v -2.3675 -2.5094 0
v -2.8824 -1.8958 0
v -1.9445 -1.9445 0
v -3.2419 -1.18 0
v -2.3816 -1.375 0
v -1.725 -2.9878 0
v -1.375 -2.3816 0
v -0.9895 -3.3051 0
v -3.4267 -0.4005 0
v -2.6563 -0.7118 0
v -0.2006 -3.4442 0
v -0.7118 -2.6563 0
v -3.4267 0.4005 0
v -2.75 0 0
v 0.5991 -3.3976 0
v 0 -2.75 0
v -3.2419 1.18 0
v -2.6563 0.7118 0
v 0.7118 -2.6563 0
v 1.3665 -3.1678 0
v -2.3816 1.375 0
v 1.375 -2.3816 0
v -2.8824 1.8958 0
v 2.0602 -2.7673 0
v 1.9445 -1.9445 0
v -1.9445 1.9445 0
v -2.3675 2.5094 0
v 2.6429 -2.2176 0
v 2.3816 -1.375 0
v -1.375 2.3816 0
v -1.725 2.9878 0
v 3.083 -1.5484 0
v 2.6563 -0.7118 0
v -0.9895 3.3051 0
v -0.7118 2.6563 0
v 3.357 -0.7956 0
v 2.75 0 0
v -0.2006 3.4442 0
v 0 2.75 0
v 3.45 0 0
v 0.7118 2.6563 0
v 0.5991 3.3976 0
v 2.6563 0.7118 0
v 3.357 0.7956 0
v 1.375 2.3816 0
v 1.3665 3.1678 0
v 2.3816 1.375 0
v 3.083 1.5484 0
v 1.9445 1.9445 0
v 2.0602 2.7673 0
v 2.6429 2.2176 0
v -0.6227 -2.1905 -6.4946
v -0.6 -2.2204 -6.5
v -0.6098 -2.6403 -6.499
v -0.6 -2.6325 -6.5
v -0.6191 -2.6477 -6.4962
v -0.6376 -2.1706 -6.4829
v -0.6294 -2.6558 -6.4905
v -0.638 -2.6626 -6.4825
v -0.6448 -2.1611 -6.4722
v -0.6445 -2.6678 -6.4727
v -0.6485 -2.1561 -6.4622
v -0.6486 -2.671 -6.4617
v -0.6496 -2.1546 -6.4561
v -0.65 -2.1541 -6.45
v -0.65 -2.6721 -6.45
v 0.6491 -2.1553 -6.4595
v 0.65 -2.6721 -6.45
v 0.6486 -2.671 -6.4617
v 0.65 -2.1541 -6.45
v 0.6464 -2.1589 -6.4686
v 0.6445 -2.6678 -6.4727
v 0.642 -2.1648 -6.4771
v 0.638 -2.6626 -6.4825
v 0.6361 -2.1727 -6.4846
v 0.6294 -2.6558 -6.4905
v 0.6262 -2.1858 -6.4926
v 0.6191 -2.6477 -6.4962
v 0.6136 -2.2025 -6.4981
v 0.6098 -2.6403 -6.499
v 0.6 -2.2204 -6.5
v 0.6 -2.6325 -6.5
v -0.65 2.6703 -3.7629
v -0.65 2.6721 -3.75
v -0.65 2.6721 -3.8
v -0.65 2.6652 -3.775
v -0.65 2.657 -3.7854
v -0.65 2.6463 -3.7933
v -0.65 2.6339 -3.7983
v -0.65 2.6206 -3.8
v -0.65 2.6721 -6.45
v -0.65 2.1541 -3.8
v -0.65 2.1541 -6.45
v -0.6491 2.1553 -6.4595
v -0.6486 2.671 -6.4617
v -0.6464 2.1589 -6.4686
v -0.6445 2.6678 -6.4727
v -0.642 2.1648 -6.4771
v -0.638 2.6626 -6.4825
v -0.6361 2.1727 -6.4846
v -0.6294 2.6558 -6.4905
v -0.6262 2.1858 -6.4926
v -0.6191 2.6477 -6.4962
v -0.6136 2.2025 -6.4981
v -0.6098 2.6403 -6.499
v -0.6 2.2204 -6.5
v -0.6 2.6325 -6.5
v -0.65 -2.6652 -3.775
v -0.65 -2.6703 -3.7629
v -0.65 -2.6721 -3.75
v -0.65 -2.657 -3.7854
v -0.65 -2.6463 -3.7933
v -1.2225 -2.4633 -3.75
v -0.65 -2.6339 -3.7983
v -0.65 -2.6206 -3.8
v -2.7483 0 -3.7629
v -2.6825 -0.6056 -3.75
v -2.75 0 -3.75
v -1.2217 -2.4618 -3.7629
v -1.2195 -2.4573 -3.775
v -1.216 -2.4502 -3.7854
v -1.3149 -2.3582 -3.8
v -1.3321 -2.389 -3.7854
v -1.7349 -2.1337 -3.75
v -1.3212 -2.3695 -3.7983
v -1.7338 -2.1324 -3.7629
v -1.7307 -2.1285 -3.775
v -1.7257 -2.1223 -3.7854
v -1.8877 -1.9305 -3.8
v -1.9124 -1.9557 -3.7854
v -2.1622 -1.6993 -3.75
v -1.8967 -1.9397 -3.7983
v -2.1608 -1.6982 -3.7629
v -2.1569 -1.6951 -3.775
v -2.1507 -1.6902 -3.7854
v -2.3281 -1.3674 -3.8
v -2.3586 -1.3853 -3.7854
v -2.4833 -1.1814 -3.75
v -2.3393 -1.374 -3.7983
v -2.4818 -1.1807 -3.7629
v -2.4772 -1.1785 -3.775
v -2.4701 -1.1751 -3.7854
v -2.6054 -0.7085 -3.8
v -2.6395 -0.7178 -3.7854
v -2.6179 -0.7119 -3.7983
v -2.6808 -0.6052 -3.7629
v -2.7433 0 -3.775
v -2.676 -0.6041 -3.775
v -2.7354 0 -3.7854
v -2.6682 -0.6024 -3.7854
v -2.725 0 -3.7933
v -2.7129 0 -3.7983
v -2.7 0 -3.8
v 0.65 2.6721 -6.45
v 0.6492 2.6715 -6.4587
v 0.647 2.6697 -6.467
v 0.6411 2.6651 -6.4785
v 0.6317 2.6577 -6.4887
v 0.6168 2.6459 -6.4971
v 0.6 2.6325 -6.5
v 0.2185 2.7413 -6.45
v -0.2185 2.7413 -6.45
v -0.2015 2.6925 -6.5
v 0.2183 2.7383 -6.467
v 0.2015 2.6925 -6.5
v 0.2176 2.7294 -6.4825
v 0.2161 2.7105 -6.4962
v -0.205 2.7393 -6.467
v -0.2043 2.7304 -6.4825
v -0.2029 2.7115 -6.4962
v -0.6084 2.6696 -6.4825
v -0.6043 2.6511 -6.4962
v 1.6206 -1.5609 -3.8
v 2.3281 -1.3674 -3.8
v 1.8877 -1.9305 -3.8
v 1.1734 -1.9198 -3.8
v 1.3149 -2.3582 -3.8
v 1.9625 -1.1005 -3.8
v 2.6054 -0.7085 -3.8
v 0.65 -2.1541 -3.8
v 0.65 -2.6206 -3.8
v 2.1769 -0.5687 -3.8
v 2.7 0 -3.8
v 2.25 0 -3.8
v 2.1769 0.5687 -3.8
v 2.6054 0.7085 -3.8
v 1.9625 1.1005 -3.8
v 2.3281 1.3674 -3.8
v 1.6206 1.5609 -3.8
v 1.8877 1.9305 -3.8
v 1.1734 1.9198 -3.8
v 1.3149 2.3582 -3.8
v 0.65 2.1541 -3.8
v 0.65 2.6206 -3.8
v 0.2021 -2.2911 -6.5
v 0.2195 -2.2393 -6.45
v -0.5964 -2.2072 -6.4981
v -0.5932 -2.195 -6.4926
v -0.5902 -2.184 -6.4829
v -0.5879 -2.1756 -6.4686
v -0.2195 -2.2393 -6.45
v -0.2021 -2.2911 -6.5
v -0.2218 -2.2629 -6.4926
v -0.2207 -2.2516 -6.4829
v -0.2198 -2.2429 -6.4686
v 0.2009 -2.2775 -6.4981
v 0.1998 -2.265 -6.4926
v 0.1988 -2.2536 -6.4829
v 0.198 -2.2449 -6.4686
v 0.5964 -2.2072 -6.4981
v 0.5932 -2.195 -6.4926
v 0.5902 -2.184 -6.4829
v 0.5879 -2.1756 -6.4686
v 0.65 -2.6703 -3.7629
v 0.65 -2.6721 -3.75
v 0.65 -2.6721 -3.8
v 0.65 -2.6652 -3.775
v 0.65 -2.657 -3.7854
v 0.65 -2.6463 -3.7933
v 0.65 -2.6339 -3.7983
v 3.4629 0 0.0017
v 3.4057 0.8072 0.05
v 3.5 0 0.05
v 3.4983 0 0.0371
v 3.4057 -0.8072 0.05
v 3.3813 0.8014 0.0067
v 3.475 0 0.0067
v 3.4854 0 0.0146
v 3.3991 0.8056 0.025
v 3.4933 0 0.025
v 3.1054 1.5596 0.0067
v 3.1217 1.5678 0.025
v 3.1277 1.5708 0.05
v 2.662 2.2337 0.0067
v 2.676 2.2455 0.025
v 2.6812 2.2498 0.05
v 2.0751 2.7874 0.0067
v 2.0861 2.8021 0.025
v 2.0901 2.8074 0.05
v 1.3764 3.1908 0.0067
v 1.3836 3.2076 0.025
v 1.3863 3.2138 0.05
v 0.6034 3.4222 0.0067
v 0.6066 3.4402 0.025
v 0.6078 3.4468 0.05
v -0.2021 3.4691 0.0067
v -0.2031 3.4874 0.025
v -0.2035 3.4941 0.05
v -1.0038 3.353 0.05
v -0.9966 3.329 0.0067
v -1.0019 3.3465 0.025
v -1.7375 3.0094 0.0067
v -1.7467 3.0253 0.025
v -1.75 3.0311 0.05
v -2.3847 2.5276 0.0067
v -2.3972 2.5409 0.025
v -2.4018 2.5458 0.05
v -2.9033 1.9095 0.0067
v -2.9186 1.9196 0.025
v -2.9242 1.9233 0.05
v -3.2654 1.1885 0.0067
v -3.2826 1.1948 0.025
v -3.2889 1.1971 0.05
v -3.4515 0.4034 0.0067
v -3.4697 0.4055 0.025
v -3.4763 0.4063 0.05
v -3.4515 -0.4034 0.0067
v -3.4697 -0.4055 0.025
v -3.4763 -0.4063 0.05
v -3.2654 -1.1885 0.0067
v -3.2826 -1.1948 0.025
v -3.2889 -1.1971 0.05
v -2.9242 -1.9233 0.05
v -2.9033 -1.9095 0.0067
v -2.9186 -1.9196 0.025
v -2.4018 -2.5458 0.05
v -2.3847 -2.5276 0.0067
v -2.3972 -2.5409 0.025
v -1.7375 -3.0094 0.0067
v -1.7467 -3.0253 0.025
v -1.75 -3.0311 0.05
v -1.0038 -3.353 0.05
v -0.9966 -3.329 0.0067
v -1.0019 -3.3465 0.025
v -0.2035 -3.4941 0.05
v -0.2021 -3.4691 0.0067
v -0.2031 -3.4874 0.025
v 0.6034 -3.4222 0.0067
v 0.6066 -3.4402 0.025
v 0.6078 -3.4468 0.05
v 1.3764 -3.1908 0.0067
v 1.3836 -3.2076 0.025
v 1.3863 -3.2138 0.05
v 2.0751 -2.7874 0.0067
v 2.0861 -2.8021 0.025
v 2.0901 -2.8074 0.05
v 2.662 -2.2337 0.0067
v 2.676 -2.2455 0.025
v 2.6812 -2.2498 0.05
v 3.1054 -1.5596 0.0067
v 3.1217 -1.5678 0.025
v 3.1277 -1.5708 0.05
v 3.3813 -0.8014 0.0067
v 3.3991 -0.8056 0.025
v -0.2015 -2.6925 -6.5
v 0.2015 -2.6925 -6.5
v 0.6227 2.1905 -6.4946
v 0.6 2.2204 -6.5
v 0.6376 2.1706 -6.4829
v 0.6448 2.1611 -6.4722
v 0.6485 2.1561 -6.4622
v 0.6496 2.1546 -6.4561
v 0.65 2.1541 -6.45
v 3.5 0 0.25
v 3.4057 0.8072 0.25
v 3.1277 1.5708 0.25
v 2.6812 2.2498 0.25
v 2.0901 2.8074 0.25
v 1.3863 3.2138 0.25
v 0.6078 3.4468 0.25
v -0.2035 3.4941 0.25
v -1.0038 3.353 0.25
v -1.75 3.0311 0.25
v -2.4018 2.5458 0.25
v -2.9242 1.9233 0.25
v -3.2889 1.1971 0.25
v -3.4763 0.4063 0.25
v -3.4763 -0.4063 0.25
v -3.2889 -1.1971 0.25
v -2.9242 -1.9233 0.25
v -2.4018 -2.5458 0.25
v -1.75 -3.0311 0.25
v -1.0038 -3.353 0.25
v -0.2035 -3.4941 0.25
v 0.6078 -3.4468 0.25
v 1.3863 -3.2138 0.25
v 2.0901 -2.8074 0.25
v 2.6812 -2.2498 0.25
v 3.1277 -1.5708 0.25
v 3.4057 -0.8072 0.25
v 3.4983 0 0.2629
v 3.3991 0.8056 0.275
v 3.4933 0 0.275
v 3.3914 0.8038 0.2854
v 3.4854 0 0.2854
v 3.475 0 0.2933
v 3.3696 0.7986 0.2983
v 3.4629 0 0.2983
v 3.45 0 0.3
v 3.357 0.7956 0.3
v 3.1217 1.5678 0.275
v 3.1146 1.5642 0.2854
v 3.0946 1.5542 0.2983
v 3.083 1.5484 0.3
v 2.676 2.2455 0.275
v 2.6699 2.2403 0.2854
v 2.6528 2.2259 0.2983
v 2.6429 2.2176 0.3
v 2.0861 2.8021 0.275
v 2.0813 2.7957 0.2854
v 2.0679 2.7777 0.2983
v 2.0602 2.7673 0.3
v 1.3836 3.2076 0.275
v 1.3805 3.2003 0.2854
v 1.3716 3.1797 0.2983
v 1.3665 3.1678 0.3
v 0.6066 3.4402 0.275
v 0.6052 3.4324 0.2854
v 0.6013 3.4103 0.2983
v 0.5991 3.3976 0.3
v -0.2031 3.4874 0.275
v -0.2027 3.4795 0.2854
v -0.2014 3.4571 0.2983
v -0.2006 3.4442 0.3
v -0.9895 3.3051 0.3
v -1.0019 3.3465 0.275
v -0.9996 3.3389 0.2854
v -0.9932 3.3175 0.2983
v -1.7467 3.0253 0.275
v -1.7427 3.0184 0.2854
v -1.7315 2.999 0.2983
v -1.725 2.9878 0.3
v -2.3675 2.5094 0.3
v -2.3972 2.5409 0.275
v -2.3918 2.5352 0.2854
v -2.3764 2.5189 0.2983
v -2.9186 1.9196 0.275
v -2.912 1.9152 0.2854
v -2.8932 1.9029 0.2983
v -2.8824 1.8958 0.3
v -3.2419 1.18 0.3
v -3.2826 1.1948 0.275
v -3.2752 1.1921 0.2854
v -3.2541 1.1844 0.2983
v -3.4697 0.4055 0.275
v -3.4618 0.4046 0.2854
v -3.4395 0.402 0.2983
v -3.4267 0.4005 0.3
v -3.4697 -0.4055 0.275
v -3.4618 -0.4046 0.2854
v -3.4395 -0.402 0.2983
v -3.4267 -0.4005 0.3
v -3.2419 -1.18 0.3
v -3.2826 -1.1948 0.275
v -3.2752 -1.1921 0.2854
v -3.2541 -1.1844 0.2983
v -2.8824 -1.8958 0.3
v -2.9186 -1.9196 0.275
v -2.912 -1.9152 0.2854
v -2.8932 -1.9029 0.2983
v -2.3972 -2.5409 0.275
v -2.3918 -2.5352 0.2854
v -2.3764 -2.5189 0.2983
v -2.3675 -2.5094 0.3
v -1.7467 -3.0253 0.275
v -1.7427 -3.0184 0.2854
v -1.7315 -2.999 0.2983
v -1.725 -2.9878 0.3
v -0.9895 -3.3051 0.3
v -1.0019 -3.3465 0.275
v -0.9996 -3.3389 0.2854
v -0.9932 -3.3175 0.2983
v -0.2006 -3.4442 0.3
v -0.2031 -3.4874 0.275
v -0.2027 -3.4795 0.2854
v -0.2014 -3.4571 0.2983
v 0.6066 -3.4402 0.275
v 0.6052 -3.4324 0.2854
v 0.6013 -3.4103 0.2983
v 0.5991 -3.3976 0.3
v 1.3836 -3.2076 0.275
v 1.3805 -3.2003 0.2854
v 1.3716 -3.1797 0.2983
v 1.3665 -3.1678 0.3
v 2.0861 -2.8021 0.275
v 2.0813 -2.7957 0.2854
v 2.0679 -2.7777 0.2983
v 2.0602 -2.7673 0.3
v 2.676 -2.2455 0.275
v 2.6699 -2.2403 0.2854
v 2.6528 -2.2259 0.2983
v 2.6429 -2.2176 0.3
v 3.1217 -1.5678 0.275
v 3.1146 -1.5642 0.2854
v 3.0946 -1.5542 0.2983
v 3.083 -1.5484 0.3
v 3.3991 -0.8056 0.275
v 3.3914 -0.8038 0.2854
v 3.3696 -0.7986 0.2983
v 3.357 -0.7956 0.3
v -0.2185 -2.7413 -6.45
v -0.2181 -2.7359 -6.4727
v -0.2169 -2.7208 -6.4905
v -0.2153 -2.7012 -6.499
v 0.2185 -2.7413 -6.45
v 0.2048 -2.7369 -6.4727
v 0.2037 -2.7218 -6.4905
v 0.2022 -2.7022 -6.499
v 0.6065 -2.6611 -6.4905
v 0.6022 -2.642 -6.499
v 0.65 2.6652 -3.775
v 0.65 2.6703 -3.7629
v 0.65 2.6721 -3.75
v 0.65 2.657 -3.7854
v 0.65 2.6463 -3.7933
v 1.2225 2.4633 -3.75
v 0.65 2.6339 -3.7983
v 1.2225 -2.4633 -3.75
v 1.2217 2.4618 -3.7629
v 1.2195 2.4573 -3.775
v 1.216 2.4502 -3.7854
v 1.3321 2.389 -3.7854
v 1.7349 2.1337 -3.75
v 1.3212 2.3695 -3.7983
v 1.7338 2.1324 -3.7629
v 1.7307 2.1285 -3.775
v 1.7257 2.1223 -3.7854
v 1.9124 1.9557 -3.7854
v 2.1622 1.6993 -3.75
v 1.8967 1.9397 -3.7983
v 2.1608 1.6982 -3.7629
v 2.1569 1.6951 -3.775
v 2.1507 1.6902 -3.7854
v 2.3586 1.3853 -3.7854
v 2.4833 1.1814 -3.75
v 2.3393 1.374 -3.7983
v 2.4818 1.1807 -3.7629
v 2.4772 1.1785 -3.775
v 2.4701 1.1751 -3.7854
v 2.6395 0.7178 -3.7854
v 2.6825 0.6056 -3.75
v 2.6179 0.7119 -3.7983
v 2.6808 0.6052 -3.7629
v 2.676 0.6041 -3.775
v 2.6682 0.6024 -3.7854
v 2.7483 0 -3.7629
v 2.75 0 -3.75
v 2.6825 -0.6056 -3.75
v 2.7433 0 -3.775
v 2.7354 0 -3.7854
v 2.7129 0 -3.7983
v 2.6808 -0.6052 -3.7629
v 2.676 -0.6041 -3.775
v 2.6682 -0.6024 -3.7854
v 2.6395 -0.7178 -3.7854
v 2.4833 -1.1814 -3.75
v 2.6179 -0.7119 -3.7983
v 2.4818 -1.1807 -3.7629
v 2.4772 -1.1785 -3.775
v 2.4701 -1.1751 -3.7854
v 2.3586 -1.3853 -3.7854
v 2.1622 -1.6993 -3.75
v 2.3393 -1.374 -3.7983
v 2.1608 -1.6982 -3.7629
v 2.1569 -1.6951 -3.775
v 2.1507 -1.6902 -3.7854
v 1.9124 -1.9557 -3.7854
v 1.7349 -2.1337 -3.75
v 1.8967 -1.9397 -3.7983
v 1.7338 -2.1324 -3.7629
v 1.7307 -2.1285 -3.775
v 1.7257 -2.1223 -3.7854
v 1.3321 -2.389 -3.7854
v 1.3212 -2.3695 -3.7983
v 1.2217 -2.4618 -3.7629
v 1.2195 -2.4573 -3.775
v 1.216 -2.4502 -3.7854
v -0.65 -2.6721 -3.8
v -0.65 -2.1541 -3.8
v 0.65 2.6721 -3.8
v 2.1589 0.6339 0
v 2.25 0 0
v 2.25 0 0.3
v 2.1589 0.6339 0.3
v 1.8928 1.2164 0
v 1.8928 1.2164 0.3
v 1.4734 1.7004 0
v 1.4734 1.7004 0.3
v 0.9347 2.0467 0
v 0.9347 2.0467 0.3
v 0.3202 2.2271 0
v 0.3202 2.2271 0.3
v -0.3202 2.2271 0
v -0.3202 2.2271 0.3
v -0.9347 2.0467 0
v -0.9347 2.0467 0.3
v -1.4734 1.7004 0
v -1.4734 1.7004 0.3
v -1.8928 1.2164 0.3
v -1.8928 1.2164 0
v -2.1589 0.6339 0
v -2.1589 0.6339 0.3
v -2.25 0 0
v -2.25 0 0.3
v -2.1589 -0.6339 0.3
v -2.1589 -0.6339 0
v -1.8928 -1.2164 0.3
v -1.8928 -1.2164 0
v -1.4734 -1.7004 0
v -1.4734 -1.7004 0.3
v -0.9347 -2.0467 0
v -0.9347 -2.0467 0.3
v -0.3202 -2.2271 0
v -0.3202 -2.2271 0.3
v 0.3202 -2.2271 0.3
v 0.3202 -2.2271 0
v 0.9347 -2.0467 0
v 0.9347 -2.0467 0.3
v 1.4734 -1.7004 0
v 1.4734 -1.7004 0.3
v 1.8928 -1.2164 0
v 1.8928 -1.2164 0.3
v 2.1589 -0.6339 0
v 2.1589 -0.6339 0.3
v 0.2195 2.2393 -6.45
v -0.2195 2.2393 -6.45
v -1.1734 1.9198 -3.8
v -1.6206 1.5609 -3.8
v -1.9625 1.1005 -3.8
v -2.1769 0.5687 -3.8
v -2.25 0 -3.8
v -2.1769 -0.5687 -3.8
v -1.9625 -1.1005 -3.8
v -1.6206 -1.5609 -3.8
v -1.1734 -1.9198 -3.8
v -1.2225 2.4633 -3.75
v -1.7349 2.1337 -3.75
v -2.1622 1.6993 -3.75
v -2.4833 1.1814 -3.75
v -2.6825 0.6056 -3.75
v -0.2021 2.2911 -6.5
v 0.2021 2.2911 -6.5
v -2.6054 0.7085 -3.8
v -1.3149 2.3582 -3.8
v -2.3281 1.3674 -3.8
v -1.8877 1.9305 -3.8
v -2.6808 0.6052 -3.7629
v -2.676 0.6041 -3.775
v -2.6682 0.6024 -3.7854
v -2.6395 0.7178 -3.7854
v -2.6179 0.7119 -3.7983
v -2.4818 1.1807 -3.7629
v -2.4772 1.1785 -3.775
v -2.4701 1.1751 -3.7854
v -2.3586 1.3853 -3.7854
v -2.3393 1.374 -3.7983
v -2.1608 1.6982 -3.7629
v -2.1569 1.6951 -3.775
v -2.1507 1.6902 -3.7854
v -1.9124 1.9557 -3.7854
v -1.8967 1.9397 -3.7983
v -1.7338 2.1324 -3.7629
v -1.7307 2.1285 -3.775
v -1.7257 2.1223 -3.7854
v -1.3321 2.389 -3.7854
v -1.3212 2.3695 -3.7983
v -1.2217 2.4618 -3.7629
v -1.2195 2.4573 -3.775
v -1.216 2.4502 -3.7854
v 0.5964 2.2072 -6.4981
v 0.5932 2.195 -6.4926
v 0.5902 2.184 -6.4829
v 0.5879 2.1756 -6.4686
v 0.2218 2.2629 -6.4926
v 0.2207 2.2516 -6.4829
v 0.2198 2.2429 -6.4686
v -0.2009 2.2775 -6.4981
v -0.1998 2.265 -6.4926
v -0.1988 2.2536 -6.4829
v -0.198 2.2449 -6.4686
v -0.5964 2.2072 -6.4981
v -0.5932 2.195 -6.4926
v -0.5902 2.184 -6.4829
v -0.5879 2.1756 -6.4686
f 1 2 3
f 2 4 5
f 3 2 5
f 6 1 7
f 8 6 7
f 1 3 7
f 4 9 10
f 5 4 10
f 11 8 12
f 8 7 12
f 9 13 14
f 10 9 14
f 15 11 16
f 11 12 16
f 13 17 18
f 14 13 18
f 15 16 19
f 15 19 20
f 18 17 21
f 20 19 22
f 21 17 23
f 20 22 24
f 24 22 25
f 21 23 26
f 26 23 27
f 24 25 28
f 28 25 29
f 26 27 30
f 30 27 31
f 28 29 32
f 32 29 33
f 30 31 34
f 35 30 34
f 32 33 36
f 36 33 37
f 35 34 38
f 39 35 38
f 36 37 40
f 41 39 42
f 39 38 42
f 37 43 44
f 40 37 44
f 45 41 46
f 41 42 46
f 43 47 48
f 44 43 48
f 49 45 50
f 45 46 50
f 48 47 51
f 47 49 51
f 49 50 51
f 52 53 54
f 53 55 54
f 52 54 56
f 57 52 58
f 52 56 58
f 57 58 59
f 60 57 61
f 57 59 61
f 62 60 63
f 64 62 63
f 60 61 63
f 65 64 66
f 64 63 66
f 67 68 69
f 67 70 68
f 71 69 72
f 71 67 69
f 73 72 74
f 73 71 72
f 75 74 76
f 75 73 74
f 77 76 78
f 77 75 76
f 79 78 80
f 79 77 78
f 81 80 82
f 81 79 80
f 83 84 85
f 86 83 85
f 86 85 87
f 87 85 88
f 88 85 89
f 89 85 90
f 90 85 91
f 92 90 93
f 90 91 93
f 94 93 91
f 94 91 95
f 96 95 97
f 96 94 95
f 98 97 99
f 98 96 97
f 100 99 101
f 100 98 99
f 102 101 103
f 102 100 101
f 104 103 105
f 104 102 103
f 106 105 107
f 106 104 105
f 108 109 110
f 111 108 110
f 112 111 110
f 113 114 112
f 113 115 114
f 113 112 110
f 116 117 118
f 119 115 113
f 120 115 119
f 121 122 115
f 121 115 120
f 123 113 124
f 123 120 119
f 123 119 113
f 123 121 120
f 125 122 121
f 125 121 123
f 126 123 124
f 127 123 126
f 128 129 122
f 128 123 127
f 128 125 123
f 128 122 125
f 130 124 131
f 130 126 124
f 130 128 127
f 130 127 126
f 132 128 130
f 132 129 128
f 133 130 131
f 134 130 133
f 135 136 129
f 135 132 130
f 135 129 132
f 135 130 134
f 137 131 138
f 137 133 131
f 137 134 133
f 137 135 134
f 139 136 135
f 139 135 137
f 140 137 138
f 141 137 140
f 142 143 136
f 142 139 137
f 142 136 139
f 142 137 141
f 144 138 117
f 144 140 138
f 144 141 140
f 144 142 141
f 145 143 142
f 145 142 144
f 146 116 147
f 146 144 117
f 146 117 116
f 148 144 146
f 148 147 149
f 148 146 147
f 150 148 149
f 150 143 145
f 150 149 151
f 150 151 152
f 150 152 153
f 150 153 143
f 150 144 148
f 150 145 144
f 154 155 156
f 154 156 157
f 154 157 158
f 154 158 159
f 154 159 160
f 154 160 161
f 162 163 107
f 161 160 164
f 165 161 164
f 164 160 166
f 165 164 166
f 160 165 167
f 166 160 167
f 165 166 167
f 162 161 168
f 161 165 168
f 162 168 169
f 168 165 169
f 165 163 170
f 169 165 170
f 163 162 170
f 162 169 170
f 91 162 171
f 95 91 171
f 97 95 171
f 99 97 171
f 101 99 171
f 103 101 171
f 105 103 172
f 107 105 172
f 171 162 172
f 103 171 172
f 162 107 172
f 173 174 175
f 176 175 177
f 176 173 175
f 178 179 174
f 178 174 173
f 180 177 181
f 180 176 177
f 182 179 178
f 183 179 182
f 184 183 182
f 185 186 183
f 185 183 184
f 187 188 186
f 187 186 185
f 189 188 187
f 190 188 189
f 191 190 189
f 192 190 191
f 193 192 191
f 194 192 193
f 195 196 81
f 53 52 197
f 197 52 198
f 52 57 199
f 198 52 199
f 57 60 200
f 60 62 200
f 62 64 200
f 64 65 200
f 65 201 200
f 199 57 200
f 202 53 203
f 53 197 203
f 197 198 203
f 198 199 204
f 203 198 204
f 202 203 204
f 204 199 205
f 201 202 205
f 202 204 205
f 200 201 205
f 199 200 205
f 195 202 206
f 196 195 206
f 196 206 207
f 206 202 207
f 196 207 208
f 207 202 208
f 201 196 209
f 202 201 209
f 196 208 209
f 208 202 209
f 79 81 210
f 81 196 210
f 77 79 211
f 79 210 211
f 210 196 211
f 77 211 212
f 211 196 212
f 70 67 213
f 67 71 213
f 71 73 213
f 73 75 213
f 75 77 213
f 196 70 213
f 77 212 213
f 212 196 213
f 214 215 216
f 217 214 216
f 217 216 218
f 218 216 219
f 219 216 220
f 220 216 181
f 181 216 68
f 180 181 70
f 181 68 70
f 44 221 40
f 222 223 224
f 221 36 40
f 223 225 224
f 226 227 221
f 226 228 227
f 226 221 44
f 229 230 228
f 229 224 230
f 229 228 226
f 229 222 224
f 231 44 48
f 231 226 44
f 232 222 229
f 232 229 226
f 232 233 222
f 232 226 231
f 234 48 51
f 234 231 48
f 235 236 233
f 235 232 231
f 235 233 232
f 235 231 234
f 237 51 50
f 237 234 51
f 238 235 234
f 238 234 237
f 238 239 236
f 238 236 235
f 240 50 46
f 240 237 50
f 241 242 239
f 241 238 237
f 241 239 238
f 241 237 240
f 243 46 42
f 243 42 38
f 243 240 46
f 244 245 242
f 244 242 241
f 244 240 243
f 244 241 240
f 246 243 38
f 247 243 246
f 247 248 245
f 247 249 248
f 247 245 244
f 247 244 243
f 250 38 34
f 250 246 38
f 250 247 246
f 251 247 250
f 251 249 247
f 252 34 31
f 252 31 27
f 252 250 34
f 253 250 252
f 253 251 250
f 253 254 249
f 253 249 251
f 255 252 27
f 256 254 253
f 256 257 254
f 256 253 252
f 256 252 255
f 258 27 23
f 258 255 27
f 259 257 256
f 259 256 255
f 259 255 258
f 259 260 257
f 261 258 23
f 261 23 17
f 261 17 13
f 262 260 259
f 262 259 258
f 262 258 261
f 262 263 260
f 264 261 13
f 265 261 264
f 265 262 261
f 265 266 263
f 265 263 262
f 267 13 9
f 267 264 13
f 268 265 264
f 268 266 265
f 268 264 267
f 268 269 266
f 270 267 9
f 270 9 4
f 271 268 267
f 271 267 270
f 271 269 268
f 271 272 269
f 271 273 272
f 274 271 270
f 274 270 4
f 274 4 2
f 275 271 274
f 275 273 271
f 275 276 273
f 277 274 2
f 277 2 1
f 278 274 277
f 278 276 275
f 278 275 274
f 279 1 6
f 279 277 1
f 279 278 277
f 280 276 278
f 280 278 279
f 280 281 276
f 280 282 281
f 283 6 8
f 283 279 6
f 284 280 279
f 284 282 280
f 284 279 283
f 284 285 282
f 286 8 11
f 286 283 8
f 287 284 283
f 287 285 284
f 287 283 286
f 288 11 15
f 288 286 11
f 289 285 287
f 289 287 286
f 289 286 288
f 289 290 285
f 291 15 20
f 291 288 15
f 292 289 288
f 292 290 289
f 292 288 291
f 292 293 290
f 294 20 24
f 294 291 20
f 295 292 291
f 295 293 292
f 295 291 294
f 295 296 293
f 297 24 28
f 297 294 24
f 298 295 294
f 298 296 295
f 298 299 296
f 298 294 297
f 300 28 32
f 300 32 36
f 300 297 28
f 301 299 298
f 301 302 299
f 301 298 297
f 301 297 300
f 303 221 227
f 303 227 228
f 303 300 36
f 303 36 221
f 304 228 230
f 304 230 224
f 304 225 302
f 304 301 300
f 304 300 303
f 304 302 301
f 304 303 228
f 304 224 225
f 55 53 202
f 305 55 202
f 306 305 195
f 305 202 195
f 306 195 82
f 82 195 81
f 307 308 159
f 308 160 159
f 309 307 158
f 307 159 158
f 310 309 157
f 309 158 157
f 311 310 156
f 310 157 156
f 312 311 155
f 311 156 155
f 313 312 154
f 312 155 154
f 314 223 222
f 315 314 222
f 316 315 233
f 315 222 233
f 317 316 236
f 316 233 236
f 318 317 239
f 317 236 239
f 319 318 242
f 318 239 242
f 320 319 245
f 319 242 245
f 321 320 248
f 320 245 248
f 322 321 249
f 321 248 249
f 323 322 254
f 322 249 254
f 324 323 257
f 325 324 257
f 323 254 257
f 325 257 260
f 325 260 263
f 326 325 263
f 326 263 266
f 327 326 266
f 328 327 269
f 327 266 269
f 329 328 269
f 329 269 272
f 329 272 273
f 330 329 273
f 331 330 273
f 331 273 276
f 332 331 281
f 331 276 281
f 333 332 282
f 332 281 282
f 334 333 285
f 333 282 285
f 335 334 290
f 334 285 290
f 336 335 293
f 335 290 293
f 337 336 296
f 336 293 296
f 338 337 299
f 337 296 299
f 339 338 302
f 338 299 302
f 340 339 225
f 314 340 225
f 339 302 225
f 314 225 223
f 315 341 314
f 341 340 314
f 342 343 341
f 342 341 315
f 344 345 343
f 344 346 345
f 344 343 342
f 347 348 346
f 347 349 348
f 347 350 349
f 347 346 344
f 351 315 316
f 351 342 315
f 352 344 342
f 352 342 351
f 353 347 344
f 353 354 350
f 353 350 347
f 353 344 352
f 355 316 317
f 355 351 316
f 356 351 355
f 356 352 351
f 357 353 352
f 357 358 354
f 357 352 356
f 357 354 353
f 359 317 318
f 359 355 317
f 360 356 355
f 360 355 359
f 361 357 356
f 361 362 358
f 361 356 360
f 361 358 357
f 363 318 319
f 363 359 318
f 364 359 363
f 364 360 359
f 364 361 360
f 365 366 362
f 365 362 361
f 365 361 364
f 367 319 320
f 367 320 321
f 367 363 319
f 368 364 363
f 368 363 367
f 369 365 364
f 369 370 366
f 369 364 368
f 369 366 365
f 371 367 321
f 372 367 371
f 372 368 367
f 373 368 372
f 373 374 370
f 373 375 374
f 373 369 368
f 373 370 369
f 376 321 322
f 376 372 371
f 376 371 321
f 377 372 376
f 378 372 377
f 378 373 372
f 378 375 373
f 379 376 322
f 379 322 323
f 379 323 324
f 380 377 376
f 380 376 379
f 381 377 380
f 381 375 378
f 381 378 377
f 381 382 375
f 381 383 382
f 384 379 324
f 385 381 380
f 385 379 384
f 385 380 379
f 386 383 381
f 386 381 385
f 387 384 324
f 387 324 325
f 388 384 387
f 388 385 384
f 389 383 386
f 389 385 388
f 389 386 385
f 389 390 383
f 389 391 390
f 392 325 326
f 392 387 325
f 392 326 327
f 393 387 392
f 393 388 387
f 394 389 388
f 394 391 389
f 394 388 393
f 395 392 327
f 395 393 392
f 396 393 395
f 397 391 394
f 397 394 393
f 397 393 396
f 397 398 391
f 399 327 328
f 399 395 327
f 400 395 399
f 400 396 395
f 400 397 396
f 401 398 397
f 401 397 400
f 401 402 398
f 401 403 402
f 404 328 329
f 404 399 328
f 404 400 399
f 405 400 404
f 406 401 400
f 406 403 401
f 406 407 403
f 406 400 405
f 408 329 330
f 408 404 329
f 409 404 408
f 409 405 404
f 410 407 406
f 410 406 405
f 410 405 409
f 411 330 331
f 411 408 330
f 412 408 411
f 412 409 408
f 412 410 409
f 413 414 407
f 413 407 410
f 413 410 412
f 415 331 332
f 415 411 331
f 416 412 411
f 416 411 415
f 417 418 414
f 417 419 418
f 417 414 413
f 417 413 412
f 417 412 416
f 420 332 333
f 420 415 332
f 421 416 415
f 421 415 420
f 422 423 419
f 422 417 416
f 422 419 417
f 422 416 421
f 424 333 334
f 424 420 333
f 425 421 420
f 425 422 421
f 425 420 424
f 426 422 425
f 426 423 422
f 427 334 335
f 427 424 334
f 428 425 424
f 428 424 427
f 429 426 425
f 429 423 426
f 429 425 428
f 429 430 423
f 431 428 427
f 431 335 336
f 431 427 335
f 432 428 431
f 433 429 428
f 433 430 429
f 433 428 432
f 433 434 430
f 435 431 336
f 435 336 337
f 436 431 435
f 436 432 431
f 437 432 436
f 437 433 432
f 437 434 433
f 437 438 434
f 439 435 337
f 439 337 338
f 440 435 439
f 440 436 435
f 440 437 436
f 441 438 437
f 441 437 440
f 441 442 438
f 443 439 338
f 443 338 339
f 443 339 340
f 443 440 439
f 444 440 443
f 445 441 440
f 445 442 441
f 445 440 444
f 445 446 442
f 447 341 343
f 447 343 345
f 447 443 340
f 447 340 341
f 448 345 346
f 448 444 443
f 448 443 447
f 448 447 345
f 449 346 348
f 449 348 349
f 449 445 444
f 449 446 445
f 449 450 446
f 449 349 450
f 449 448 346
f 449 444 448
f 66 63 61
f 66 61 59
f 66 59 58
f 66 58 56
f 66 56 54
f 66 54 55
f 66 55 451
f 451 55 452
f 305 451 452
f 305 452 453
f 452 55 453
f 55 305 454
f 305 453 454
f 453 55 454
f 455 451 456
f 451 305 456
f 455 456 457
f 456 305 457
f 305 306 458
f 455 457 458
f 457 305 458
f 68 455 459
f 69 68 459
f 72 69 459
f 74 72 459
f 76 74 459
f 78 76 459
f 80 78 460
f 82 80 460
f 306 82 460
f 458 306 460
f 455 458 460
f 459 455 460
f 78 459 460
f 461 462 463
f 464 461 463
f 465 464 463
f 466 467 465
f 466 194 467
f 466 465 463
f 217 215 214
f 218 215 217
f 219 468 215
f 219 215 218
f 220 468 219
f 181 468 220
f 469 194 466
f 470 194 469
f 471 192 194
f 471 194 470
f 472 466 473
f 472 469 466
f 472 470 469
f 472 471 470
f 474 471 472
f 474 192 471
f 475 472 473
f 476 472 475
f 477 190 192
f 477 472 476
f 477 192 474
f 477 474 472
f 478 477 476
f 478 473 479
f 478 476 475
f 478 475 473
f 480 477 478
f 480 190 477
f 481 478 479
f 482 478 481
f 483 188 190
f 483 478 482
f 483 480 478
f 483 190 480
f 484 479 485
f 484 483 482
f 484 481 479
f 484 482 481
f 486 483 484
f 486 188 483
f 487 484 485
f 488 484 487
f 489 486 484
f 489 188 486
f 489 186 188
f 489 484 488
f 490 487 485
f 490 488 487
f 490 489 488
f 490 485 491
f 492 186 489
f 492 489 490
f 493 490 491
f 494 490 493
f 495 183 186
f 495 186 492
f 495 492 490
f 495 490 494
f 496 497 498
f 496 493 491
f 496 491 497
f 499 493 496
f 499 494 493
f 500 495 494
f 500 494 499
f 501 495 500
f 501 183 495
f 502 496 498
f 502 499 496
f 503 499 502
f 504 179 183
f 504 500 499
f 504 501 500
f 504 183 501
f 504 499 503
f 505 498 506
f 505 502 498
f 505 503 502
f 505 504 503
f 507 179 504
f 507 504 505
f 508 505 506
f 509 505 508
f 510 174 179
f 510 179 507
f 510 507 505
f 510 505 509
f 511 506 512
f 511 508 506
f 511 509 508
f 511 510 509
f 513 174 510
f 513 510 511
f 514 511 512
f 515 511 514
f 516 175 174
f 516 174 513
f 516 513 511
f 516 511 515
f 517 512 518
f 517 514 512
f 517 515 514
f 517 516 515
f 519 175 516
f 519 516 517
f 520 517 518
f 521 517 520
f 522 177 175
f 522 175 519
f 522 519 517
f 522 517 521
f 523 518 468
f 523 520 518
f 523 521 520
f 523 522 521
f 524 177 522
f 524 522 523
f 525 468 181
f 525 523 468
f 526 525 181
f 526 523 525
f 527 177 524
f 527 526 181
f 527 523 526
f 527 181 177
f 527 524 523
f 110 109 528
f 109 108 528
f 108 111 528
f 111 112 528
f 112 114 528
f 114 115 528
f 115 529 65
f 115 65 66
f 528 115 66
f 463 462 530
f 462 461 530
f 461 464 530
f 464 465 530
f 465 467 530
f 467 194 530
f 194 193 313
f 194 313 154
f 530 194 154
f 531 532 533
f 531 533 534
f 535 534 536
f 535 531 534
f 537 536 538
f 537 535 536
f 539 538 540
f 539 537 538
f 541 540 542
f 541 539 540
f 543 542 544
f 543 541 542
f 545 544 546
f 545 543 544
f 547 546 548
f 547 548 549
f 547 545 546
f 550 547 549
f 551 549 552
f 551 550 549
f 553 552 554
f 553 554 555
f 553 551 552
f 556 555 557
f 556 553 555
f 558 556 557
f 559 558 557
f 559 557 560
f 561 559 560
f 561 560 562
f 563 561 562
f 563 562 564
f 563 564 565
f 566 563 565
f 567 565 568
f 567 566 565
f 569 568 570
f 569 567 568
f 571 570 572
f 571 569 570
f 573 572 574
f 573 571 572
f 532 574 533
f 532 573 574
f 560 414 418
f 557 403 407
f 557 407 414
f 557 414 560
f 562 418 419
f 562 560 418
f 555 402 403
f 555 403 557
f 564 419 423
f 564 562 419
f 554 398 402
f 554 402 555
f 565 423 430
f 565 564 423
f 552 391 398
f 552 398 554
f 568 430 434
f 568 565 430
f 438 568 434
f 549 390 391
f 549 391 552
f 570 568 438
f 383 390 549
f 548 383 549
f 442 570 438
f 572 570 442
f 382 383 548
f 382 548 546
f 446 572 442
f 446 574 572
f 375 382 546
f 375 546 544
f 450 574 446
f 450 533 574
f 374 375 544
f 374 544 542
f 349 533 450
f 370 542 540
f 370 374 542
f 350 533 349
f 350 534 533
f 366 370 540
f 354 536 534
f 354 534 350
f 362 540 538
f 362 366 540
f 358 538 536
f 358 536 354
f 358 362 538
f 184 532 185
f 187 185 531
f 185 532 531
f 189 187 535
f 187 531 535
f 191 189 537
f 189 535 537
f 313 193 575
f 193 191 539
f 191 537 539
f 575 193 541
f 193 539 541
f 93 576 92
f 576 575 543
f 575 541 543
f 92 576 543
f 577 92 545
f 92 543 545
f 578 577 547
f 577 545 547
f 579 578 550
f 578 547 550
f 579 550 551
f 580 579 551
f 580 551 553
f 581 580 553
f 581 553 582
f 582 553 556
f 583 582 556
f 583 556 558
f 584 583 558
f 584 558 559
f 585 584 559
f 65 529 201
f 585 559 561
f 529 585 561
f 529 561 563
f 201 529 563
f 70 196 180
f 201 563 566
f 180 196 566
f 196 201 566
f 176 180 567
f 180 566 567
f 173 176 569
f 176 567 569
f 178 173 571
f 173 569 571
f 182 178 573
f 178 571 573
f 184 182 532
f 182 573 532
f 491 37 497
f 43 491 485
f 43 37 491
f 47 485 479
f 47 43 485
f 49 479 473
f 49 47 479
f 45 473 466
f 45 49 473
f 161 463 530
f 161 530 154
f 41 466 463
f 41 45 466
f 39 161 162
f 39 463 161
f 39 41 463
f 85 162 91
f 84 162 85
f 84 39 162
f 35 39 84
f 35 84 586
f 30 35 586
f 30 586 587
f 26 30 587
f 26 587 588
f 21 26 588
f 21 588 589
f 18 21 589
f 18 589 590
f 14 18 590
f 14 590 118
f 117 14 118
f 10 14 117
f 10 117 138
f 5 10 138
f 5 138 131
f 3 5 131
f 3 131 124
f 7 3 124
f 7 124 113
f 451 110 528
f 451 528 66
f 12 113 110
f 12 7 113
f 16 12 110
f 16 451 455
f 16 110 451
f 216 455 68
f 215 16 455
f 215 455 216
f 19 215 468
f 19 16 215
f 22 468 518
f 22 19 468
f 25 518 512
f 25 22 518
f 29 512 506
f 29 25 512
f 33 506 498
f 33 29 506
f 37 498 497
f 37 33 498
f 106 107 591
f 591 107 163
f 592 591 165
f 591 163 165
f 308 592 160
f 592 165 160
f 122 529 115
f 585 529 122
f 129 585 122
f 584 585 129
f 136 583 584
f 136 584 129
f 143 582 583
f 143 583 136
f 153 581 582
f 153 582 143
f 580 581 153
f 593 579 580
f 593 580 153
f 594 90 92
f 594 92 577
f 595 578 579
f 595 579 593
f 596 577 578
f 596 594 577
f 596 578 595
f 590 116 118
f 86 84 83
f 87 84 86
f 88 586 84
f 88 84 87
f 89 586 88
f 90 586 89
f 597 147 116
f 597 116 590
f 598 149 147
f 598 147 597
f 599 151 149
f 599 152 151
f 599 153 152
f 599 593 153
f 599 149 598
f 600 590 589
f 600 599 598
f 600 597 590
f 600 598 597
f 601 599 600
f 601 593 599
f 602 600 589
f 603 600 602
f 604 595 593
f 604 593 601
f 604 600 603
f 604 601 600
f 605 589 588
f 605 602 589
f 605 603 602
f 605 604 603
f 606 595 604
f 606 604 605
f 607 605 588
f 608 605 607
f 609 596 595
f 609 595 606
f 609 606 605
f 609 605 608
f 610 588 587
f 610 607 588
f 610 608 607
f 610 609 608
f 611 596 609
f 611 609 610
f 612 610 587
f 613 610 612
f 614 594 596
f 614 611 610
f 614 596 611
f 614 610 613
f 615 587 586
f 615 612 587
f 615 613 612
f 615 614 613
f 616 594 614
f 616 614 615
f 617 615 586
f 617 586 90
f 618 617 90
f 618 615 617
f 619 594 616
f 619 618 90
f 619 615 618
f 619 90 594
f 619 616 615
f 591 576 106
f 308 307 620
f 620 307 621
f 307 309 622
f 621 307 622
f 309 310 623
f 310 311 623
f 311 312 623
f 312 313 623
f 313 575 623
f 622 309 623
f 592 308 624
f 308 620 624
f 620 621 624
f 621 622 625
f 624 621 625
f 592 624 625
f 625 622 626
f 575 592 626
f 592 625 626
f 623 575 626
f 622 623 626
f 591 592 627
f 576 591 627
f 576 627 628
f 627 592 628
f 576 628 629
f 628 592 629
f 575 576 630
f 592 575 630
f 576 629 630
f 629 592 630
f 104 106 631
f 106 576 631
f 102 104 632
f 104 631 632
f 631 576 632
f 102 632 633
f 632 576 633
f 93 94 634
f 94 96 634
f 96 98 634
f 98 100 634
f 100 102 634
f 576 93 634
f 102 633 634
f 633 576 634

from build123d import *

# Parameters (mm, degrees)
SKETCH_1_R          = 3.5
SKETCH_1_R_2        = 2.75
SKETCH_1_R_3        = 2.25
EXTRUDE_1_DEPTH     = 0.3
SKETCH_1_4_R        = 2.75
SKETCH_1_4_R_2      = 2.25
EXTRUDE_2_DEPTH     = 6.5
CUT_EXTRUDE_1_DEPTH = 2.7
FILLET_1_R          = 0.05


with BuildPart() as part:
    # Sketch 1 → Extrude 1 (new body)
    with BuildSketch(Plane.XY):
        Circle(SKETCH_1_R)
        Circle(SKETCH_1_R_2, mode=Mode.SUBTRACT)
        Circle(SKETCH_1_R_2)
        Circle(SKETCH_1_R_3, mode=Mode.SUBTRACT)
    extrude(amount=EXTRUDE_1_DEPTH)

    # Sketch 1_4 → Extrude 2 (add)
    with BuildSketch(Plane.XY):
        Circle(SKETCH_1_4_R)
        Circle(SKETCH_1_4_R_2, mode=Mode.SUBTRACT)
    extrude(amount=-EXTRUDE_2_DEPTH)

    # Sketch 2 → Cut-Extrude 1 (cut)
    with BuildSketch(Plane(origin=(0, 0, -6.5), x_dir=(-1, 0, 0), z_dir=(0, 0, -1))):
        with BuildLine():
            ThreePointArc((-0.65, 2.672077843), (-2.75, 0), (-0.65, -2.672077843))
            Line((-0.65, -2.672077843), (-0.65, -2.154065923))
            ThreePointArc((-0.65, -2.154065923), (-2.25, 0), (-0.65, 2.154065923))
            Line((-0.65, 2.154065923), (-0.65, 2.672077843))
        make_face()
        with BuildLine():
            Line((0.65, -2.154065923), (0.65, -2.672077843))
            ThreePointArc((0.65, -2.672077843), (2.162174831, -1.699264547), (2.75, 0))
            ThreePointArc((2.75, 0), (2.162174831, 1.699264547), (0.65, 2.672077843))
            Line((0.65, 2.672077843), (0.65, 2.154065923))
            ThreePointArc((0.65, 2.154065923), (1.806239187, 1.341640786), (2.25, 0))
            ThreePointArc((2.25, 0), (1.806239187, -1.341640786), (0.65, -2.154065923))
        make_face()
    extrude(amount=-CUT_EXTRUDE_1_DEPTH, mode=Mode.SUBTRACT)

    # Fillet 1
    fillet_1_edges = [part.edges().sort_by_distance(p)[0] for p in [
        (2.162174831, -1.699264547, -3.8),
        (0.65, -2.413071883, -6.5),
        (0.65, 2.413071883, -6.5),
        (0, -2.75, -6.5),
        (0, -2.25, -6.5),
        (-0.65, -2.413071883, -6.5),
        (-0.65, 2.413071883, -6.5),
        (-2.75, 0, -3.8),
        (-3.5, 0, 0),
        (-3.5, 0, 0.3),
        (0, 2.75, -6.5),
        (0, 2.25, -6.5),
    ]]
    fillet(fillet_1_edges, radius=FILLET_1_R)


solid = part.part
